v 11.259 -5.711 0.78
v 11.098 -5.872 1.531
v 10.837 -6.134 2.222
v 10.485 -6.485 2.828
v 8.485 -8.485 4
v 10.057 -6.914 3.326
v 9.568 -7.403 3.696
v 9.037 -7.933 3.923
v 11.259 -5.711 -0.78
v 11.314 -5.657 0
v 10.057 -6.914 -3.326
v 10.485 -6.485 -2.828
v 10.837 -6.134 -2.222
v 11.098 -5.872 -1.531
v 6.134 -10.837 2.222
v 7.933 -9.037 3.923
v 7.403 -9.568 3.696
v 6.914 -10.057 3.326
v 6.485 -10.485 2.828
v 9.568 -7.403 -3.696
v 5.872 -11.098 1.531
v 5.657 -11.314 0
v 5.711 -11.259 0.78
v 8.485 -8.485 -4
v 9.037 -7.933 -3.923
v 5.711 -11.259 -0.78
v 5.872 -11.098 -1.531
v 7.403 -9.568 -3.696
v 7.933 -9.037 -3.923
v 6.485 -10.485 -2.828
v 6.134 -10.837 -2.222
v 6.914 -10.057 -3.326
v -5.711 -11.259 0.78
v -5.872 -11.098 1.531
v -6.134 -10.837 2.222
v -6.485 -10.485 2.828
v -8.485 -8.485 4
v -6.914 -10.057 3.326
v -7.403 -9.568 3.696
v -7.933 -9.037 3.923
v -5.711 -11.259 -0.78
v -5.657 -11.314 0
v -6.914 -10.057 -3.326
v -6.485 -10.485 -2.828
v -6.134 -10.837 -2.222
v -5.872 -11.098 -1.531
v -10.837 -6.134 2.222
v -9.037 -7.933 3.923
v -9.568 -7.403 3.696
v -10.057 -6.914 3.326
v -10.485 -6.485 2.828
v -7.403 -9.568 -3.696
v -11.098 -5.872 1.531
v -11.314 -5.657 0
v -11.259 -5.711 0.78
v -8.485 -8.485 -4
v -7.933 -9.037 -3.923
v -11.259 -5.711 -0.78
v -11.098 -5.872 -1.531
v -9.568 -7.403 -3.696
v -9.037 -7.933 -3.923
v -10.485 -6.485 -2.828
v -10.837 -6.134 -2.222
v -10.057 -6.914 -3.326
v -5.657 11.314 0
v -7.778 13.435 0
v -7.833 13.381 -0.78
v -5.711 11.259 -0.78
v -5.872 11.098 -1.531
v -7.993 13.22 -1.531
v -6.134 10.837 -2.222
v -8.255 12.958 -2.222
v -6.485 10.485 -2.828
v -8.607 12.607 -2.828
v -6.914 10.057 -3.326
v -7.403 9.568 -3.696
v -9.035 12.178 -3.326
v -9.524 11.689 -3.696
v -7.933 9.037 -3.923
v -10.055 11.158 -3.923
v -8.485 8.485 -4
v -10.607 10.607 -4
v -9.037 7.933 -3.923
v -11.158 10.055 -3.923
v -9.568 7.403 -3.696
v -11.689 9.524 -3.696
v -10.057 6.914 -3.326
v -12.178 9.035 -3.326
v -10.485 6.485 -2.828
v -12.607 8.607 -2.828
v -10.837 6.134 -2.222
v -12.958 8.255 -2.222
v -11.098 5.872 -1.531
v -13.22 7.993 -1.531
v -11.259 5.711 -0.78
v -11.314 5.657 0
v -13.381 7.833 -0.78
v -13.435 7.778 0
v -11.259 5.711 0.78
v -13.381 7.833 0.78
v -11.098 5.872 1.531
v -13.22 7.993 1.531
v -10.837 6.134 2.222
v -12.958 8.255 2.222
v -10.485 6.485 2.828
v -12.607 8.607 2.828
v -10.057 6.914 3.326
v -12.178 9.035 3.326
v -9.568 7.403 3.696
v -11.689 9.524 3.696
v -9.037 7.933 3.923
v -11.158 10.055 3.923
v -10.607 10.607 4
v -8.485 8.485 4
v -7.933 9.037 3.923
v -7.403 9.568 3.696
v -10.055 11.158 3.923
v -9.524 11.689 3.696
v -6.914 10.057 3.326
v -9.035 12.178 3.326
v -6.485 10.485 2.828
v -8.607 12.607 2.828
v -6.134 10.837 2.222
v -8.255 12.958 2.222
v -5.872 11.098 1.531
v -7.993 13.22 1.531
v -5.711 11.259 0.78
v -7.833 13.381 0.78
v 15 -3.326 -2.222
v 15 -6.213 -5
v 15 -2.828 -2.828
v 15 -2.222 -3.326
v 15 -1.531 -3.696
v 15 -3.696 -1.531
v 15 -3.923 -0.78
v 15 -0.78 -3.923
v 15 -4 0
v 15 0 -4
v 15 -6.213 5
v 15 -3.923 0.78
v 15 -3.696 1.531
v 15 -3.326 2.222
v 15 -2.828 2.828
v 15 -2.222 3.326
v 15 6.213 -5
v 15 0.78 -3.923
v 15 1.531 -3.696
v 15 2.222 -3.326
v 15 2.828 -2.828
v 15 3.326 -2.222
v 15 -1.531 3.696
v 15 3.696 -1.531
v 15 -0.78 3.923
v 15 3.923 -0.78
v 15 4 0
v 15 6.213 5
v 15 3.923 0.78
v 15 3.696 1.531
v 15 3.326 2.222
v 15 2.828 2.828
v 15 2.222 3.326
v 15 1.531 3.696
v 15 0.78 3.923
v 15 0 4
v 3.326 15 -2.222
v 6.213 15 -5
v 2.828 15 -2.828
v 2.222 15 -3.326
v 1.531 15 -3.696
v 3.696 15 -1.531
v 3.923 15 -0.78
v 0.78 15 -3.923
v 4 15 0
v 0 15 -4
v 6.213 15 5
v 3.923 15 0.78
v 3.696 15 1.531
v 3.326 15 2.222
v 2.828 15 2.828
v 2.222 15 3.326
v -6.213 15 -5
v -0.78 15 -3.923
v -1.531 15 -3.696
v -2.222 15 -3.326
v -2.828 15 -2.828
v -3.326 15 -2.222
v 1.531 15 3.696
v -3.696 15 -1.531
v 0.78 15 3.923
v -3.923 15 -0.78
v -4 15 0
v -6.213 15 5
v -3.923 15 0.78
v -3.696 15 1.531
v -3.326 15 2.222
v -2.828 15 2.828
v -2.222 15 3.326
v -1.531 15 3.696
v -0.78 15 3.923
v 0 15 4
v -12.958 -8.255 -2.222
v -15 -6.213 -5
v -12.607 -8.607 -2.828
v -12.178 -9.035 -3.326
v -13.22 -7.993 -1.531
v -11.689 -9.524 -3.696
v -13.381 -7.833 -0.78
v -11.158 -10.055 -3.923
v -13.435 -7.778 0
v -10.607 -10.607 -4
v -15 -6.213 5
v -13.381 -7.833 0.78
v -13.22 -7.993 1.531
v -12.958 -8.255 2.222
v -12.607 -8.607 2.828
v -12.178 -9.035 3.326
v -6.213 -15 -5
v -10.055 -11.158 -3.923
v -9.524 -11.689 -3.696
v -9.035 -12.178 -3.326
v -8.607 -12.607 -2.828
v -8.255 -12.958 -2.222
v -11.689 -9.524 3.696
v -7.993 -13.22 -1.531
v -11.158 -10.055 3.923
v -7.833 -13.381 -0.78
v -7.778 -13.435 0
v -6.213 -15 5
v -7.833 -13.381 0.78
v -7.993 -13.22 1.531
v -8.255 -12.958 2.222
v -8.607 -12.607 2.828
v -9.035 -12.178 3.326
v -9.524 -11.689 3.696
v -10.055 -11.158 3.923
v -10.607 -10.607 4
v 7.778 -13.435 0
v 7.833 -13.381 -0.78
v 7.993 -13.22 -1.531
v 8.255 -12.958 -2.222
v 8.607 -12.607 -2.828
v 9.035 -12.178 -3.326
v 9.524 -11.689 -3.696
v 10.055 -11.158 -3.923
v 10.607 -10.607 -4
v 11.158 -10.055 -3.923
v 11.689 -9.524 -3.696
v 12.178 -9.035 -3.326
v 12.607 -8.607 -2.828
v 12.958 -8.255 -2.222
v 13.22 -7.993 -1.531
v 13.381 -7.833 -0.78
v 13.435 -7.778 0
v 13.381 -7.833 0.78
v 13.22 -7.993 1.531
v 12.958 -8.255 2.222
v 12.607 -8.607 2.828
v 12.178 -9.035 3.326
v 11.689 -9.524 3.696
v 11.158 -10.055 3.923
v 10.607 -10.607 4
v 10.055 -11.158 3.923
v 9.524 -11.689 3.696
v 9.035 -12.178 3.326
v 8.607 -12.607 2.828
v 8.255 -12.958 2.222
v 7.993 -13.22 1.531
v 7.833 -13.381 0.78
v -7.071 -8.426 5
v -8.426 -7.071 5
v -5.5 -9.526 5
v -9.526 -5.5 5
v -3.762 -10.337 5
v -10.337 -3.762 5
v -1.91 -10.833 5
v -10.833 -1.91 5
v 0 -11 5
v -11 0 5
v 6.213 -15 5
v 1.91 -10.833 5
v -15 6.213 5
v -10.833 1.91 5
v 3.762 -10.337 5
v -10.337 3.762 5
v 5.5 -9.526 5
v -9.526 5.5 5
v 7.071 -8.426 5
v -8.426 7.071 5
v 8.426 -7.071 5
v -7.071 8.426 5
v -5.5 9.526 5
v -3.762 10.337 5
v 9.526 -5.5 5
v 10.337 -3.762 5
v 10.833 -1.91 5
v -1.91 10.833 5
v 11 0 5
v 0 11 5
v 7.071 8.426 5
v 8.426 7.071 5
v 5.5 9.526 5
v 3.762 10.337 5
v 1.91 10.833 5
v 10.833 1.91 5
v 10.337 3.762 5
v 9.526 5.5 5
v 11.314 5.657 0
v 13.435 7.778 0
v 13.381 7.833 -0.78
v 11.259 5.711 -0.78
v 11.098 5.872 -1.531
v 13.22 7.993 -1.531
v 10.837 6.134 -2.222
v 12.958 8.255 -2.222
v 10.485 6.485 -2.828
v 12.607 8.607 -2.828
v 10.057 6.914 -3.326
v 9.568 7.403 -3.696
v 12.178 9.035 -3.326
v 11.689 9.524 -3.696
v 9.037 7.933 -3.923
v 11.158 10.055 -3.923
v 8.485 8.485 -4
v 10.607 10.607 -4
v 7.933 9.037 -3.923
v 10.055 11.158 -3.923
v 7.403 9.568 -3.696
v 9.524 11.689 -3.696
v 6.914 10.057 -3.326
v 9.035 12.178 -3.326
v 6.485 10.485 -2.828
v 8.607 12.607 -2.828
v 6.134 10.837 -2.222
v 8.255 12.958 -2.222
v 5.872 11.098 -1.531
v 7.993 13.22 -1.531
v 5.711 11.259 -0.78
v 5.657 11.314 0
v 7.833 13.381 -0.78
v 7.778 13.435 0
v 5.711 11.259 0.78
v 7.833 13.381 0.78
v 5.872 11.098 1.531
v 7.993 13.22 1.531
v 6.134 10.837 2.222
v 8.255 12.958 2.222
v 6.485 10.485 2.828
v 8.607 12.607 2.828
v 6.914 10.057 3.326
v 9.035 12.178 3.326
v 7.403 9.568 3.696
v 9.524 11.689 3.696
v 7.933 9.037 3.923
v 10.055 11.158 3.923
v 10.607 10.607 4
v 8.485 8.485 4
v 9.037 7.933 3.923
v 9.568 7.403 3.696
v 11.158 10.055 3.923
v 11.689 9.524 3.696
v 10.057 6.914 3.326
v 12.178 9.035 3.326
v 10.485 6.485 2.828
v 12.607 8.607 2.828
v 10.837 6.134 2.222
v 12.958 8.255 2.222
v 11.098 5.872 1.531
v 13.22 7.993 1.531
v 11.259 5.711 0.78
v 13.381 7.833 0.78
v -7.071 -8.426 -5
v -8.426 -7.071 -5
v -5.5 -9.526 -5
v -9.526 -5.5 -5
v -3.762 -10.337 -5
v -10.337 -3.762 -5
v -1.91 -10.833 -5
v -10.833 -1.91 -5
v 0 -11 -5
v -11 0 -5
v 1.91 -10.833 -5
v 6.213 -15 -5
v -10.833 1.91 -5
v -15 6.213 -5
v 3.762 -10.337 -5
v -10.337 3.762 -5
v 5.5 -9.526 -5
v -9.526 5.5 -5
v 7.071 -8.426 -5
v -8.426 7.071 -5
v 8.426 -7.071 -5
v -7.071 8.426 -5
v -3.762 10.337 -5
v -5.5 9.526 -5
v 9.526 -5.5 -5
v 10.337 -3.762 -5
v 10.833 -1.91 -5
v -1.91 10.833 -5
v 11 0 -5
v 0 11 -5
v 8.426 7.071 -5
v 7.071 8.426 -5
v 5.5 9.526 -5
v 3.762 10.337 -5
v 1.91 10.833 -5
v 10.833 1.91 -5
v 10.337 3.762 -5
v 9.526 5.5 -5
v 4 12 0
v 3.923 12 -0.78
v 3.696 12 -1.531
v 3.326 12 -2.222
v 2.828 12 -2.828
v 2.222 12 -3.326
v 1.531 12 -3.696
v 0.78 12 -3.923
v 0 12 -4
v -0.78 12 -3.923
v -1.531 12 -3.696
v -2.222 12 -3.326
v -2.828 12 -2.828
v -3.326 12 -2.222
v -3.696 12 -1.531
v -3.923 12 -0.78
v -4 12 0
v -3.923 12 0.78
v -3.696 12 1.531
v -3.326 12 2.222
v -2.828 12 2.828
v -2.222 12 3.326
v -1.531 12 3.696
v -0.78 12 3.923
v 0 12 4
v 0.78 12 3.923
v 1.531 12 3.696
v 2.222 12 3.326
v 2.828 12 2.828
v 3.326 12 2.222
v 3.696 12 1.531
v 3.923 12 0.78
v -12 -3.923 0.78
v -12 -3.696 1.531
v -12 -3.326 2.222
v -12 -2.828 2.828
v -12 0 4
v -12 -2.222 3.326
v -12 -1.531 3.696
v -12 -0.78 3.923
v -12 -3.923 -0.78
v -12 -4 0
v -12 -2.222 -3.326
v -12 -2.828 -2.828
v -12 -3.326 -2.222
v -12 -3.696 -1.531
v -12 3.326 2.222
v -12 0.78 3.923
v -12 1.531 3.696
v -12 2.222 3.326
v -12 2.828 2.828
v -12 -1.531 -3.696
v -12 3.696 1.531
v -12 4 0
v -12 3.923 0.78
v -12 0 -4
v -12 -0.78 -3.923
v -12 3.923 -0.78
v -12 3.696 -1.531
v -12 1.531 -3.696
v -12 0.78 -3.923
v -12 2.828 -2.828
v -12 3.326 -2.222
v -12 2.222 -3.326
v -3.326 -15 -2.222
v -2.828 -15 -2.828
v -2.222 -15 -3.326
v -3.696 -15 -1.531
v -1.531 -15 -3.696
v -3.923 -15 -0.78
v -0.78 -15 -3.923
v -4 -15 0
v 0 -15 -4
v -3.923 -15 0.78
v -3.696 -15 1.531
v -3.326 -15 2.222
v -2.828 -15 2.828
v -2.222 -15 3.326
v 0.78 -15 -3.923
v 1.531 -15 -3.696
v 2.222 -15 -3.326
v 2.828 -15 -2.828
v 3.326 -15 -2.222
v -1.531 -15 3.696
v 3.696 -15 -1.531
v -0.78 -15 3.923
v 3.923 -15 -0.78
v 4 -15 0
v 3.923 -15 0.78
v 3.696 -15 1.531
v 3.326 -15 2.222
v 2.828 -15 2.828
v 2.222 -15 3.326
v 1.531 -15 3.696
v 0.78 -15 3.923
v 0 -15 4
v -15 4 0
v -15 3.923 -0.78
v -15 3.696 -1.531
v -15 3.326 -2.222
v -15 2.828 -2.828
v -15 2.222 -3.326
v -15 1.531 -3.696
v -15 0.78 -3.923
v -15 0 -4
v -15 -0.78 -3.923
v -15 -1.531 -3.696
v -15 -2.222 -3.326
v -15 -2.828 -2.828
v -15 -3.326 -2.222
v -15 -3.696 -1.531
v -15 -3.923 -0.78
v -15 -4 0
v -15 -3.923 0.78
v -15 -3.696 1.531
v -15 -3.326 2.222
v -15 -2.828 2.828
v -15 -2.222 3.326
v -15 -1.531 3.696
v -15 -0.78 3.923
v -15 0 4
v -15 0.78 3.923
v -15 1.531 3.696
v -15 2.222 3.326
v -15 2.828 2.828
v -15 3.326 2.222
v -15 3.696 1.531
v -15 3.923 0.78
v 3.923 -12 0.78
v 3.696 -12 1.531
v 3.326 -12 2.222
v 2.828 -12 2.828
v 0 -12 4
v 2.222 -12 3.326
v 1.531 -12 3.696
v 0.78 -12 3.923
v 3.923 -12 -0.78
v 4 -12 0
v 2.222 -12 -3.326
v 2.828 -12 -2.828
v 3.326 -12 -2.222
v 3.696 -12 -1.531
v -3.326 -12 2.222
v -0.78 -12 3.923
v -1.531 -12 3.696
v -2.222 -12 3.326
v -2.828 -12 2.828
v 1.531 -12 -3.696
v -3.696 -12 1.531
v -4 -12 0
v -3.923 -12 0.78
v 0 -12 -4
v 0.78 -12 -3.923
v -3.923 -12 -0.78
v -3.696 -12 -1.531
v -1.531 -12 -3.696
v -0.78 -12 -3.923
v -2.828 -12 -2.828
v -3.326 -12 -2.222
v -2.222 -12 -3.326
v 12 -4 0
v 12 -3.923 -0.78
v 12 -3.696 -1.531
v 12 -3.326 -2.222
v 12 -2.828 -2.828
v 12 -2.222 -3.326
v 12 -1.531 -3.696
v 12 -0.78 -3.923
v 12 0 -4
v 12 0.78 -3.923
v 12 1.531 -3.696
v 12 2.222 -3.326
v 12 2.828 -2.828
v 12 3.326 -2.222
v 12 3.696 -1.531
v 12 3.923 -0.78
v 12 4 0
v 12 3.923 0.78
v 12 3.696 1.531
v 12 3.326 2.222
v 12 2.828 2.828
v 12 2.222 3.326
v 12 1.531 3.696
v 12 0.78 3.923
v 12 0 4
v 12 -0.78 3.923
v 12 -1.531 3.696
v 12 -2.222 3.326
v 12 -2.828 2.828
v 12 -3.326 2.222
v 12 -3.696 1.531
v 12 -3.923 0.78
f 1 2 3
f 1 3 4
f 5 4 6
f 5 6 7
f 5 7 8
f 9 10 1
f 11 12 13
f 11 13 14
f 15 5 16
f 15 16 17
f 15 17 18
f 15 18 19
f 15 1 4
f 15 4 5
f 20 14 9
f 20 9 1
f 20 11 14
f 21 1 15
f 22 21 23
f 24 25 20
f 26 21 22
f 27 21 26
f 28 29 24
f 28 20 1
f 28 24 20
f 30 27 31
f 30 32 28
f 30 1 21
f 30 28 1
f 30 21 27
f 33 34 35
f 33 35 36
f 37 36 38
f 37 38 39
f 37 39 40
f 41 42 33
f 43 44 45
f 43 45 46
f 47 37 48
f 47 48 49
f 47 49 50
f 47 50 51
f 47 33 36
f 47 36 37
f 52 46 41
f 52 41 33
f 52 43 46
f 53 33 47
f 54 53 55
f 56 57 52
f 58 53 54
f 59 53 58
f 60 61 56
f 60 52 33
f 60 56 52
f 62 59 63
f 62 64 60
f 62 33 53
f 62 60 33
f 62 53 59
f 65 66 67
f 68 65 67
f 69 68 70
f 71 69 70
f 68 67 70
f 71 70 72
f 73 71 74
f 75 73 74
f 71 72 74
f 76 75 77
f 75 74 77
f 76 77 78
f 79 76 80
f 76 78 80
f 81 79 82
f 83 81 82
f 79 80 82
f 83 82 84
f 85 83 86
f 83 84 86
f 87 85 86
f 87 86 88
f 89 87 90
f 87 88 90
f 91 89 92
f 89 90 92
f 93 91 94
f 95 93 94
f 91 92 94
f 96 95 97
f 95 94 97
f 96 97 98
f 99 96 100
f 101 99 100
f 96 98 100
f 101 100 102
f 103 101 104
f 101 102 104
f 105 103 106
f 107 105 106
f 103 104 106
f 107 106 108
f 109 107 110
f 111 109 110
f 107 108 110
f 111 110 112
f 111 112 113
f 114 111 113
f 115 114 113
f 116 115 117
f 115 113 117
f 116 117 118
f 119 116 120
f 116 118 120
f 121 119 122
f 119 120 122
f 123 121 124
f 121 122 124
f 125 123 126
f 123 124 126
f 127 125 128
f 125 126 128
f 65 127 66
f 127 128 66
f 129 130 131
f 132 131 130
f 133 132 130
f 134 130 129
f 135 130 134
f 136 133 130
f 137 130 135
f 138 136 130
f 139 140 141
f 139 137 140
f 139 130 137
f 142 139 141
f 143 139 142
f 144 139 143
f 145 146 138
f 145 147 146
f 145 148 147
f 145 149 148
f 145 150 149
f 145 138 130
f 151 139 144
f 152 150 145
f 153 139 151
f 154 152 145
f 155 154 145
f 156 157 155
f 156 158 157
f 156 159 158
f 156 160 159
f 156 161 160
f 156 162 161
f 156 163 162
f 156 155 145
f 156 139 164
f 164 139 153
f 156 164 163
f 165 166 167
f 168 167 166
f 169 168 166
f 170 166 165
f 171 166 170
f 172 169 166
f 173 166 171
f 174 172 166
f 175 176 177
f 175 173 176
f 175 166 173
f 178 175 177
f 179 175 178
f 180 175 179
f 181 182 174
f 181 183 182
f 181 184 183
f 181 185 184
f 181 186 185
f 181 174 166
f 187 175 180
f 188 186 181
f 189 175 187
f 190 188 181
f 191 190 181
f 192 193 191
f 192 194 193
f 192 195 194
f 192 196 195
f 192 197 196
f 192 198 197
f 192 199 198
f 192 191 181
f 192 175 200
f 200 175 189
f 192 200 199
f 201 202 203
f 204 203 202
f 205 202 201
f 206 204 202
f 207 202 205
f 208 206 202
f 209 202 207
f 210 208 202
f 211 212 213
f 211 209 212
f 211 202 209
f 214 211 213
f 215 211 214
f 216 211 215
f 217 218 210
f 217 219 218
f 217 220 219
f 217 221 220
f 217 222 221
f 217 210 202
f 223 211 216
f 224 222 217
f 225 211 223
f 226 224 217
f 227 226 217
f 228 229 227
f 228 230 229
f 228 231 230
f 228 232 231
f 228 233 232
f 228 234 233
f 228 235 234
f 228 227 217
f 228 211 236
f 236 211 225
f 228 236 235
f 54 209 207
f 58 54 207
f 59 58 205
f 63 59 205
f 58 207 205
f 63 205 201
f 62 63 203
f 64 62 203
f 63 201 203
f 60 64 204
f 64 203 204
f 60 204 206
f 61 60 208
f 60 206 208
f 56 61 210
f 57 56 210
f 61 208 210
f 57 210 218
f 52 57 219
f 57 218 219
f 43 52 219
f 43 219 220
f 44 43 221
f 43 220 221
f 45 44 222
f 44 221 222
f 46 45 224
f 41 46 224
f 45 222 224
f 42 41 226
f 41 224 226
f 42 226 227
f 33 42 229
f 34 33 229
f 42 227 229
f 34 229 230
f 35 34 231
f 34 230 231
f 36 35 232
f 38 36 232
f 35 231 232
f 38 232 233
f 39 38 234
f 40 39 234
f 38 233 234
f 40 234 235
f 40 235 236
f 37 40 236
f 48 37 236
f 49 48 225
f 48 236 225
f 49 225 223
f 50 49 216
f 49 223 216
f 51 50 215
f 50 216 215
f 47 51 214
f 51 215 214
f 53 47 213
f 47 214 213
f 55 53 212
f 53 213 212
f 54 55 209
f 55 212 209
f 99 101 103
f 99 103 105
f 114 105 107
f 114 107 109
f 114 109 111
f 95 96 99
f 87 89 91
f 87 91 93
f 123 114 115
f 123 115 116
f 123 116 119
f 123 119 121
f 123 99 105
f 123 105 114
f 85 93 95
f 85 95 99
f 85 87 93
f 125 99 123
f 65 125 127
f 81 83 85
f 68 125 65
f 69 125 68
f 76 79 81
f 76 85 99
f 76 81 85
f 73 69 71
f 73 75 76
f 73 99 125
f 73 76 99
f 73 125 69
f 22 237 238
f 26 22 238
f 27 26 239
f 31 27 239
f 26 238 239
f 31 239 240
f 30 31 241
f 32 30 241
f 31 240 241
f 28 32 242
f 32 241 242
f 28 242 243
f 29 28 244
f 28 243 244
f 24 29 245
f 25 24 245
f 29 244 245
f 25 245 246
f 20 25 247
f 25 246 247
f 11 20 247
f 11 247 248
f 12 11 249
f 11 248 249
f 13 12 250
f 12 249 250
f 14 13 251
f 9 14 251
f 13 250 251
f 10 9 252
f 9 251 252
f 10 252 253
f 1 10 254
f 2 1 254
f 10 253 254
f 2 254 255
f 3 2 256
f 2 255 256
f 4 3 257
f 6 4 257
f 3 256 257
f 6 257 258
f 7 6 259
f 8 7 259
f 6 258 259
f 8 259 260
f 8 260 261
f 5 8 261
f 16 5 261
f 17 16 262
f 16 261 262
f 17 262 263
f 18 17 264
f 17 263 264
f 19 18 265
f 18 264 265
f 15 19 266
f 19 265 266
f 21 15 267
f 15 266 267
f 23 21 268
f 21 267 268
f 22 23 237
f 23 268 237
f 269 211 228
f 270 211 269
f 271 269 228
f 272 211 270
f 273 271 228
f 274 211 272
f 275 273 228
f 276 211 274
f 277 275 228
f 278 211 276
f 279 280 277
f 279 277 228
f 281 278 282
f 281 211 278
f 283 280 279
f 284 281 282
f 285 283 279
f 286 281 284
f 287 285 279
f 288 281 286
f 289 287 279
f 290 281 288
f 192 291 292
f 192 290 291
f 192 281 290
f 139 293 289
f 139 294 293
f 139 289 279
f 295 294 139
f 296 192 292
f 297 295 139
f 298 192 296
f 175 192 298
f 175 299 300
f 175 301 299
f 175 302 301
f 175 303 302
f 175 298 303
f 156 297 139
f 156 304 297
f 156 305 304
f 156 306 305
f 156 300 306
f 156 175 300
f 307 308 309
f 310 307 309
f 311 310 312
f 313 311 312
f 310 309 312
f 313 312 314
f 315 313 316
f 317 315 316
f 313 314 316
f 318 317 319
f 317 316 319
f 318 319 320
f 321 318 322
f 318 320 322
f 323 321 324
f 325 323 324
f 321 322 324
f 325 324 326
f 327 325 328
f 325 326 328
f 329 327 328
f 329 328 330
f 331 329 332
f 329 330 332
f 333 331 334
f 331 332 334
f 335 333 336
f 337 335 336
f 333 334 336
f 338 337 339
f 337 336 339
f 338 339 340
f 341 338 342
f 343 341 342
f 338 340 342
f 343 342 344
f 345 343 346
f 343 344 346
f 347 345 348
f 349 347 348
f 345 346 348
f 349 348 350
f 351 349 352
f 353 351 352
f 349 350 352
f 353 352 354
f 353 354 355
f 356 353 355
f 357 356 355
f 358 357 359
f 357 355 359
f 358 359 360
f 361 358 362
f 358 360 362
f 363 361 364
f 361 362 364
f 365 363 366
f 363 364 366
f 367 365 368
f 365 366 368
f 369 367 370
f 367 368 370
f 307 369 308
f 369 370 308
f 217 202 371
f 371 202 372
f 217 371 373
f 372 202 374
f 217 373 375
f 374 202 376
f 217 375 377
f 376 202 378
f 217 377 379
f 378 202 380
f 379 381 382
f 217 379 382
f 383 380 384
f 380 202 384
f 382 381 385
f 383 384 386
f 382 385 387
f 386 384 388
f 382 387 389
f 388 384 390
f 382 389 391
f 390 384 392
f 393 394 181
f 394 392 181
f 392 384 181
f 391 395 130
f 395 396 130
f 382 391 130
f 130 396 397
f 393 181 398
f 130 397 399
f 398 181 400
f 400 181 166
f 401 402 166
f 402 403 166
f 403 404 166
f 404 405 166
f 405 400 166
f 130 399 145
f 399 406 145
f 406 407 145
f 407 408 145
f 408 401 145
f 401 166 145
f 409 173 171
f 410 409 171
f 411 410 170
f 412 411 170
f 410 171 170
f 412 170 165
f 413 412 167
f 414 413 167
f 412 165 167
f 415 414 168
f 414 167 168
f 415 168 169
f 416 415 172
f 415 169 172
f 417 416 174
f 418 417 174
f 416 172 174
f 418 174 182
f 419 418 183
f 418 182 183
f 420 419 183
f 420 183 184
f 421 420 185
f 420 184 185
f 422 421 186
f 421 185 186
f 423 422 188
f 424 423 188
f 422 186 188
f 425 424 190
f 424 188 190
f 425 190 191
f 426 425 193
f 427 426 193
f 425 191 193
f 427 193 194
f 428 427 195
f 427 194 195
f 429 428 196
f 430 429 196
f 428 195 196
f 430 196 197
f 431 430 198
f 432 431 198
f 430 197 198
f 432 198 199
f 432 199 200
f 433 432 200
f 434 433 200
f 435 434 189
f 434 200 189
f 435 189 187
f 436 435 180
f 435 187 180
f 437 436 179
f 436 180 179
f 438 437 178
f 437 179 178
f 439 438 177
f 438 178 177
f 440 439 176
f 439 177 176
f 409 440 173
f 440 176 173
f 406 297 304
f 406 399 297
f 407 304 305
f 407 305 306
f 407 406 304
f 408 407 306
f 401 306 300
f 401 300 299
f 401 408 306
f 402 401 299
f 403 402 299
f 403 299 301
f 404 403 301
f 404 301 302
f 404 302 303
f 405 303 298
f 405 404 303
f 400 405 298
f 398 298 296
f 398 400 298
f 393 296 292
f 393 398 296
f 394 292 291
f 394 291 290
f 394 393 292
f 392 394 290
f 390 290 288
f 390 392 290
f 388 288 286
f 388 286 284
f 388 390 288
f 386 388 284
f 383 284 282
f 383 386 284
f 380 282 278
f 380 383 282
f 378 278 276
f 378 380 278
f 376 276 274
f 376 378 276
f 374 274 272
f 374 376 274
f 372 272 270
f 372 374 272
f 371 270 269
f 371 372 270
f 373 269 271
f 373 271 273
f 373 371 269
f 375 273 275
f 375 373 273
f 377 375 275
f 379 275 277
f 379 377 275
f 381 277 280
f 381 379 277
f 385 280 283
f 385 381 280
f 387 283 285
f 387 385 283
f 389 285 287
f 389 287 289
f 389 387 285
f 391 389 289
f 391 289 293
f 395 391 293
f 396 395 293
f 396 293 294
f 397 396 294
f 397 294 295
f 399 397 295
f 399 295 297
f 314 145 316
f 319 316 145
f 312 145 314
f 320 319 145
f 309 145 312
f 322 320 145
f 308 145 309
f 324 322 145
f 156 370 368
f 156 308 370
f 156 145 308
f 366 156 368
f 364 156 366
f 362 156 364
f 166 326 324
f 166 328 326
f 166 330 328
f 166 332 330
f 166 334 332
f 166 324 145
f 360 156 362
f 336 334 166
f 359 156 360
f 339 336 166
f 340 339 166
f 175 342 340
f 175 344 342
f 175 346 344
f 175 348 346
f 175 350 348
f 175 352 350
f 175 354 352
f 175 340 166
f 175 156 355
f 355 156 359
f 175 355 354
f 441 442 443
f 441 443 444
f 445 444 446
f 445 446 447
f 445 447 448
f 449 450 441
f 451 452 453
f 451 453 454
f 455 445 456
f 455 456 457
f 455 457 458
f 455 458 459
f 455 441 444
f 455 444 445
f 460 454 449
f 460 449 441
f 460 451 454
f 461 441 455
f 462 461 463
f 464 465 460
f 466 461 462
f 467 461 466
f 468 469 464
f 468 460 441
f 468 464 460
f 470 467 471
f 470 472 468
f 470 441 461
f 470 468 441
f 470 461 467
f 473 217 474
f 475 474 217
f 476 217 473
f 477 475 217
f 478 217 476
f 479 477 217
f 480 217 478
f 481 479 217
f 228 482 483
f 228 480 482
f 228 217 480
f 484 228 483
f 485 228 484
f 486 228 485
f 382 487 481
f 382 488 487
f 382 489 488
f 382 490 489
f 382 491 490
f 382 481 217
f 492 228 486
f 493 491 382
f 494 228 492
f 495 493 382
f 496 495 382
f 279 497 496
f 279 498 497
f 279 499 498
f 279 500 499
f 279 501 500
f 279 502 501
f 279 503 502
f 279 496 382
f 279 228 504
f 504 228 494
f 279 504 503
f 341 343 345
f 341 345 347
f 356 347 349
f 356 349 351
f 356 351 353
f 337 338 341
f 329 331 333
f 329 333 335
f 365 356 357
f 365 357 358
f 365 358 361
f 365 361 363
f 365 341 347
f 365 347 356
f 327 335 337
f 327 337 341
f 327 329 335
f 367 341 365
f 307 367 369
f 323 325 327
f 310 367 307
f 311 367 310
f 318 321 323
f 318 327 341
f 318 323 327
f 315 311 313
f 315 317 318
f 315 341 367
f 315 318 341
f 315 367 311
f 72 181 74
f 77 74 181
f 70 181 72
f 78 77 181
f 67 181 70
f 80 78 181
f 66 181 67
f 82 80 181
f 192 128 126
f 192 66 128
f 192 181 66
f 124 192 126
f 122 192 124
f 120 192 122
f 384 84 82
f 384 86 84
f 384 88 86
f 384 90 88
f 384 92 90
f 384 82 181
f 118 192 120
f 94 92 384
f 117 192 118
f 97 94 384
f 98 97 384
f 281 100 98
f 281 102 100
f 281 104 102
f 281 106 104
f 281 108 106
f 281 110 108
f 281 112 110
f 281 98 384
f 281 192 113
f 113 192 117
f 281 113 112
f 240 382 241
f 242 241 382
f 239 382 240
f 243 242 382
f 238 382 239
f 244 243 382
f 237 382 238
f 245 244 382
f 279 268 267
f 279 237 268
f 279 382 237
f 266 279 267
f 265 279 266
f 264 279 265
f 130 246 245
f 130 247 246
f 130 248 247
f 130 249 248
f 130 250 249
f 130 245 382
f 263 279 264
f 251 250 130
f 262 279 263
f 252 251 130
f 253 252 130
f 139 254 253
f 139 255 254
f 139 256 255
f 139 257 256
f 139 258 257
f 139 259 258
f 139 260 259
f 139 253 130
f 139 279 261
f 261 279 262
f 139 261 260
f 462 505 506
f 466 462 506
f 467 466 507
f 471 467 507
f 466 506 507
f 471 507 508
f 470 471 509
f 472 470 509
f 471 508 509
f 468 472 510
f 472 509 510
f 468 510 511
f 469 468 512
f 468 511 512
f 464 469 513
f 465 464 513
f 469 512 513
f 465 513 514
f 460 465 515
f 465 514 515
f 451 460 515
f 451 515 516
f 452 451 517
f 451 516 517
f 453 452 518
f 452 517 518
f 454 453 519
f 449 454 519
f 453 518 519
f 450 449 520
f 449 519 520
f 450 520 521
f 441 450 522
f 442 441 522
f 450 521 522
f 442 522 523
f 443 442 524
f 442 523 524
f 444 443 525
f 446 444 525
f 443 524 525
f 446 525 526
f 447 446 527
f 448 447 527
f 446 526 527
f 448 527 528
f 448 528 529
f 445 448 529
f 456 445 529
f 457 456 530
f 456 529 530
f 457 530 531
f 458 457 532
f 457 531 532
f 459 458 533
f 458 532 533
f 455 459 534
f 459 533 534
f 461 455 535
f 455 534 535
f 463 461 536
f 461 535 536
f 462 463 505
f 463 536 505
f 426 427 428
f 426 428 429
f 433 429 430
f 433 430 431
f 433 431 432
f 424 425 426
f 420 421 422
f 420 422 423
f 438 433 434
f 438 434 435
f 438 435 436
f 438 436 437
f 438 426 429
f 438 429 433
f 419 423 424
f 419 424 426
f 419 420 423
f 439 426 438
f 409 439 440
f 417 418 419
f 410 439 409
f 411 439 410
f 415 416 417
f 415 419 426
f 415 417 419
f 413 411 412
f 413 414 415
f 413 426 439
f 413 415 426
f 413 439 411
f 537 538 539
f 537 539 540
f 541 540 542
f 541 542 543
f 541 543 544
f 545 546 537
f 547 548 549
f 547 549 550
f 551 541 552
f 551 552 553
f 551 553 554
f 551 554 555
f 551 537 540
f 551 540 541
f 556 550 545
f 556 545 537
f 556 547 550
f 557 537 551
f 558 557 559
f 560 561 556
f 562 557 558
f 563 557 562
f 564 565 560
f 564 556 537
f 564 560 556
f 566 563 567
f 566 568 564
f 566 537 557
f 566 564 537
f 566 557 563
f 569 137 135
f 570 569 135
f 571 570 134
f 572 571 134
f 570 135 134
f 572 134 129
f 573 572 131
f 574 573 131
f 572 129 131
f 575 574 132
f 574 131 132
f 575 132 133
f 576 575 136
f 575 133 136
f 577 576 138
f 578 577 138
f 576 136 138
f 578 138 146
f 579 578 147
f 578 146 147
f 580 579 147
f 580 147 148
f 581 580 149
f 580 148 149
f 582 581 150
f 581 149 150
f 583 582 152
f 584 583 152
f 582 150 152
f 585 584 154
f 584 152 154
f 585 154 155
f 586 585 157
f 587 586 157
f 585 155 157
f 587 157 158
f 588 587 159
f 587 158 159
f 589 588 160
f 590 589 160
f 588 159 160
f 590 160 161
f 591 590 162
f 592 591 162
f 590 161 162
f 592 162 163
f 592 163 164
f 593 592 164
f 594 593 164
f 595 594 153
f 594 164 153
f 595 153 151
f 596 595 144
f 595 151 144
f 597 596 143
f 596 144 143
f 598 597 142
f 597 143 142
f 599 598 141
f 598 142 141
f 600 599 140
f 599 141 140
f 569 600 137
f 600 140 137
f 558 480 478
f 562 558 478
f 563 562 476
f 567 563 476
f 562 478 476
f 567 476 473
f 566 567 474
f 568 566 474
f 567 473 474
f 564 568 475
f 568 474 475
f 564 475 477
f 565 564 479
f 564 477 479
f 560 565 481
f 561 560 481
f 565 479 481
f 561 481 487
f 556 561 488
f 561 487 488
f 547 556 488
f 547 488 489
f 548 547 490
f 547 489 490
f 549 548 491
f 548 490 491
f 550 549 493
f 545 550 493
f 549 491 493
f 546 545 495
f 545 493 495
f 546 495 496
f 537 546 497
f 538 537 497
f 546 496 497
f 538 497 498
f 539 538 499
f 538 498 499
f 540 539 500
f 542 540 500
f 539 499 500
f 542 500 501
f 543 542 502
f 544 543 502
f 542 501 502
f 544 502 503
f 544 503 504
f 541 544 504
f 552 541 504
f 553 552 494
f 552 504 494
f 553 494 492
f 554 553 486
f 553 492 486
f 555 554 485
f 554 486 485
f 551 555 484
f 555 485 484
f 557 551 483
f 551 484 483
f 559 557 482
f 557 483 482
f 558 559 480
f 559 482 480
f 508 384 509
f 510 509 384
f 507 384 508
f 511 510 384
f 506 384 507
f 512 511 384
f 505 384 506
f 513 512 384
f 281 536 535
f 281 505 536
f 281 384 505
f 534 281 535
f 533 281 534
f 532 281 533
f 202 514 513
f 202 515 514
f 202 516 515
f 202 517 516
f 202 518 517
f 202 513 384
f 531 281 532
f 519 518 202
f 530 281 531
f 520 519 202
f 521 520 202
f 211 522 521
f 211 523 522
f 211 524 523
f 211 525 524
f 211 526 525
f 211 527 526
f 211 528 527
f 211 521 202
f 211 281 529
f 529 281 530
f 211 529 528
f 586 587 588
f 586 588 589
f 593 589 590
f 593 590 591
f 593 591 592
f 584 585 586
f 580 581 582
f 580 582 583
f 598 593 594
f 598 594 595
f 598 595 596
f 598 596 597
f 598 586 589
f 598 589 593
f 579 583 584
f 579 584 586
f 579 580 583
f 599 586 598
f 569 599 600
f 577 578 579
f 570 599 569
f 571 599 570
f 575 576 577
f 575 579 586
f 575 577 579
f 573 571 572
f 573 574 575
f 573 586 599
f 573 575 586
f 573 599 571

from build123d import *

# Parameters (mm, degrees)
SKETCH1_R           = 11
BOSS_EXTRUDE1_DEPTH = 5
SKETCH2_R           = 4
CUT_EXTRUDE3_DEPTH  = 3
CIRPATTERN1_COUNT   = 8


with BuildPart() as part:
    # Sketch1 → Boss-Extrude1 (new, symmetric)
    with BuildSketch(Plane.XY):
        Polygon((6.213203436, 15), (-6.213203436, 15), (-15, 6.213203436), (-15, -6.213203436), (-6.213203436, -15), (6.213203436, -15), (15, -6.213203436), (15, 6.213203436), align=None)
        Circle(SKETCH1_R, mode=Mode.SUBTRACT)
    extrude(amount=BOSS_EXTRUDE1_DEPTH, both=True)

    # Sketch2 → Cut-Extrude3 (cut)
    with BuildSketch(Plane(origin=(0, -15, 0), x_dir=(-1, 0, 0), z_dir=(0, -1, 0))):
        Circle(SKETCH2_R)
    cut_extrude3 = extrude(amount=-CUT_EXTRUDE3_DEPTH, mode=Mode.SUBTRACT)

    # CirPattern1: Cut-Extrude3 ×8 about axis
    cirpattern1_axis = Axis((0, 0, 5), (0, 0, 1))
    for i in range(1, CIRPATTERN1_COUNT):
        add(cut_extrude3.rotate(cirpattern1_axis, i * 360 / CIRPATTERN1_COUNT), mode=Mode.SUBTRACT)


solid = part.part
